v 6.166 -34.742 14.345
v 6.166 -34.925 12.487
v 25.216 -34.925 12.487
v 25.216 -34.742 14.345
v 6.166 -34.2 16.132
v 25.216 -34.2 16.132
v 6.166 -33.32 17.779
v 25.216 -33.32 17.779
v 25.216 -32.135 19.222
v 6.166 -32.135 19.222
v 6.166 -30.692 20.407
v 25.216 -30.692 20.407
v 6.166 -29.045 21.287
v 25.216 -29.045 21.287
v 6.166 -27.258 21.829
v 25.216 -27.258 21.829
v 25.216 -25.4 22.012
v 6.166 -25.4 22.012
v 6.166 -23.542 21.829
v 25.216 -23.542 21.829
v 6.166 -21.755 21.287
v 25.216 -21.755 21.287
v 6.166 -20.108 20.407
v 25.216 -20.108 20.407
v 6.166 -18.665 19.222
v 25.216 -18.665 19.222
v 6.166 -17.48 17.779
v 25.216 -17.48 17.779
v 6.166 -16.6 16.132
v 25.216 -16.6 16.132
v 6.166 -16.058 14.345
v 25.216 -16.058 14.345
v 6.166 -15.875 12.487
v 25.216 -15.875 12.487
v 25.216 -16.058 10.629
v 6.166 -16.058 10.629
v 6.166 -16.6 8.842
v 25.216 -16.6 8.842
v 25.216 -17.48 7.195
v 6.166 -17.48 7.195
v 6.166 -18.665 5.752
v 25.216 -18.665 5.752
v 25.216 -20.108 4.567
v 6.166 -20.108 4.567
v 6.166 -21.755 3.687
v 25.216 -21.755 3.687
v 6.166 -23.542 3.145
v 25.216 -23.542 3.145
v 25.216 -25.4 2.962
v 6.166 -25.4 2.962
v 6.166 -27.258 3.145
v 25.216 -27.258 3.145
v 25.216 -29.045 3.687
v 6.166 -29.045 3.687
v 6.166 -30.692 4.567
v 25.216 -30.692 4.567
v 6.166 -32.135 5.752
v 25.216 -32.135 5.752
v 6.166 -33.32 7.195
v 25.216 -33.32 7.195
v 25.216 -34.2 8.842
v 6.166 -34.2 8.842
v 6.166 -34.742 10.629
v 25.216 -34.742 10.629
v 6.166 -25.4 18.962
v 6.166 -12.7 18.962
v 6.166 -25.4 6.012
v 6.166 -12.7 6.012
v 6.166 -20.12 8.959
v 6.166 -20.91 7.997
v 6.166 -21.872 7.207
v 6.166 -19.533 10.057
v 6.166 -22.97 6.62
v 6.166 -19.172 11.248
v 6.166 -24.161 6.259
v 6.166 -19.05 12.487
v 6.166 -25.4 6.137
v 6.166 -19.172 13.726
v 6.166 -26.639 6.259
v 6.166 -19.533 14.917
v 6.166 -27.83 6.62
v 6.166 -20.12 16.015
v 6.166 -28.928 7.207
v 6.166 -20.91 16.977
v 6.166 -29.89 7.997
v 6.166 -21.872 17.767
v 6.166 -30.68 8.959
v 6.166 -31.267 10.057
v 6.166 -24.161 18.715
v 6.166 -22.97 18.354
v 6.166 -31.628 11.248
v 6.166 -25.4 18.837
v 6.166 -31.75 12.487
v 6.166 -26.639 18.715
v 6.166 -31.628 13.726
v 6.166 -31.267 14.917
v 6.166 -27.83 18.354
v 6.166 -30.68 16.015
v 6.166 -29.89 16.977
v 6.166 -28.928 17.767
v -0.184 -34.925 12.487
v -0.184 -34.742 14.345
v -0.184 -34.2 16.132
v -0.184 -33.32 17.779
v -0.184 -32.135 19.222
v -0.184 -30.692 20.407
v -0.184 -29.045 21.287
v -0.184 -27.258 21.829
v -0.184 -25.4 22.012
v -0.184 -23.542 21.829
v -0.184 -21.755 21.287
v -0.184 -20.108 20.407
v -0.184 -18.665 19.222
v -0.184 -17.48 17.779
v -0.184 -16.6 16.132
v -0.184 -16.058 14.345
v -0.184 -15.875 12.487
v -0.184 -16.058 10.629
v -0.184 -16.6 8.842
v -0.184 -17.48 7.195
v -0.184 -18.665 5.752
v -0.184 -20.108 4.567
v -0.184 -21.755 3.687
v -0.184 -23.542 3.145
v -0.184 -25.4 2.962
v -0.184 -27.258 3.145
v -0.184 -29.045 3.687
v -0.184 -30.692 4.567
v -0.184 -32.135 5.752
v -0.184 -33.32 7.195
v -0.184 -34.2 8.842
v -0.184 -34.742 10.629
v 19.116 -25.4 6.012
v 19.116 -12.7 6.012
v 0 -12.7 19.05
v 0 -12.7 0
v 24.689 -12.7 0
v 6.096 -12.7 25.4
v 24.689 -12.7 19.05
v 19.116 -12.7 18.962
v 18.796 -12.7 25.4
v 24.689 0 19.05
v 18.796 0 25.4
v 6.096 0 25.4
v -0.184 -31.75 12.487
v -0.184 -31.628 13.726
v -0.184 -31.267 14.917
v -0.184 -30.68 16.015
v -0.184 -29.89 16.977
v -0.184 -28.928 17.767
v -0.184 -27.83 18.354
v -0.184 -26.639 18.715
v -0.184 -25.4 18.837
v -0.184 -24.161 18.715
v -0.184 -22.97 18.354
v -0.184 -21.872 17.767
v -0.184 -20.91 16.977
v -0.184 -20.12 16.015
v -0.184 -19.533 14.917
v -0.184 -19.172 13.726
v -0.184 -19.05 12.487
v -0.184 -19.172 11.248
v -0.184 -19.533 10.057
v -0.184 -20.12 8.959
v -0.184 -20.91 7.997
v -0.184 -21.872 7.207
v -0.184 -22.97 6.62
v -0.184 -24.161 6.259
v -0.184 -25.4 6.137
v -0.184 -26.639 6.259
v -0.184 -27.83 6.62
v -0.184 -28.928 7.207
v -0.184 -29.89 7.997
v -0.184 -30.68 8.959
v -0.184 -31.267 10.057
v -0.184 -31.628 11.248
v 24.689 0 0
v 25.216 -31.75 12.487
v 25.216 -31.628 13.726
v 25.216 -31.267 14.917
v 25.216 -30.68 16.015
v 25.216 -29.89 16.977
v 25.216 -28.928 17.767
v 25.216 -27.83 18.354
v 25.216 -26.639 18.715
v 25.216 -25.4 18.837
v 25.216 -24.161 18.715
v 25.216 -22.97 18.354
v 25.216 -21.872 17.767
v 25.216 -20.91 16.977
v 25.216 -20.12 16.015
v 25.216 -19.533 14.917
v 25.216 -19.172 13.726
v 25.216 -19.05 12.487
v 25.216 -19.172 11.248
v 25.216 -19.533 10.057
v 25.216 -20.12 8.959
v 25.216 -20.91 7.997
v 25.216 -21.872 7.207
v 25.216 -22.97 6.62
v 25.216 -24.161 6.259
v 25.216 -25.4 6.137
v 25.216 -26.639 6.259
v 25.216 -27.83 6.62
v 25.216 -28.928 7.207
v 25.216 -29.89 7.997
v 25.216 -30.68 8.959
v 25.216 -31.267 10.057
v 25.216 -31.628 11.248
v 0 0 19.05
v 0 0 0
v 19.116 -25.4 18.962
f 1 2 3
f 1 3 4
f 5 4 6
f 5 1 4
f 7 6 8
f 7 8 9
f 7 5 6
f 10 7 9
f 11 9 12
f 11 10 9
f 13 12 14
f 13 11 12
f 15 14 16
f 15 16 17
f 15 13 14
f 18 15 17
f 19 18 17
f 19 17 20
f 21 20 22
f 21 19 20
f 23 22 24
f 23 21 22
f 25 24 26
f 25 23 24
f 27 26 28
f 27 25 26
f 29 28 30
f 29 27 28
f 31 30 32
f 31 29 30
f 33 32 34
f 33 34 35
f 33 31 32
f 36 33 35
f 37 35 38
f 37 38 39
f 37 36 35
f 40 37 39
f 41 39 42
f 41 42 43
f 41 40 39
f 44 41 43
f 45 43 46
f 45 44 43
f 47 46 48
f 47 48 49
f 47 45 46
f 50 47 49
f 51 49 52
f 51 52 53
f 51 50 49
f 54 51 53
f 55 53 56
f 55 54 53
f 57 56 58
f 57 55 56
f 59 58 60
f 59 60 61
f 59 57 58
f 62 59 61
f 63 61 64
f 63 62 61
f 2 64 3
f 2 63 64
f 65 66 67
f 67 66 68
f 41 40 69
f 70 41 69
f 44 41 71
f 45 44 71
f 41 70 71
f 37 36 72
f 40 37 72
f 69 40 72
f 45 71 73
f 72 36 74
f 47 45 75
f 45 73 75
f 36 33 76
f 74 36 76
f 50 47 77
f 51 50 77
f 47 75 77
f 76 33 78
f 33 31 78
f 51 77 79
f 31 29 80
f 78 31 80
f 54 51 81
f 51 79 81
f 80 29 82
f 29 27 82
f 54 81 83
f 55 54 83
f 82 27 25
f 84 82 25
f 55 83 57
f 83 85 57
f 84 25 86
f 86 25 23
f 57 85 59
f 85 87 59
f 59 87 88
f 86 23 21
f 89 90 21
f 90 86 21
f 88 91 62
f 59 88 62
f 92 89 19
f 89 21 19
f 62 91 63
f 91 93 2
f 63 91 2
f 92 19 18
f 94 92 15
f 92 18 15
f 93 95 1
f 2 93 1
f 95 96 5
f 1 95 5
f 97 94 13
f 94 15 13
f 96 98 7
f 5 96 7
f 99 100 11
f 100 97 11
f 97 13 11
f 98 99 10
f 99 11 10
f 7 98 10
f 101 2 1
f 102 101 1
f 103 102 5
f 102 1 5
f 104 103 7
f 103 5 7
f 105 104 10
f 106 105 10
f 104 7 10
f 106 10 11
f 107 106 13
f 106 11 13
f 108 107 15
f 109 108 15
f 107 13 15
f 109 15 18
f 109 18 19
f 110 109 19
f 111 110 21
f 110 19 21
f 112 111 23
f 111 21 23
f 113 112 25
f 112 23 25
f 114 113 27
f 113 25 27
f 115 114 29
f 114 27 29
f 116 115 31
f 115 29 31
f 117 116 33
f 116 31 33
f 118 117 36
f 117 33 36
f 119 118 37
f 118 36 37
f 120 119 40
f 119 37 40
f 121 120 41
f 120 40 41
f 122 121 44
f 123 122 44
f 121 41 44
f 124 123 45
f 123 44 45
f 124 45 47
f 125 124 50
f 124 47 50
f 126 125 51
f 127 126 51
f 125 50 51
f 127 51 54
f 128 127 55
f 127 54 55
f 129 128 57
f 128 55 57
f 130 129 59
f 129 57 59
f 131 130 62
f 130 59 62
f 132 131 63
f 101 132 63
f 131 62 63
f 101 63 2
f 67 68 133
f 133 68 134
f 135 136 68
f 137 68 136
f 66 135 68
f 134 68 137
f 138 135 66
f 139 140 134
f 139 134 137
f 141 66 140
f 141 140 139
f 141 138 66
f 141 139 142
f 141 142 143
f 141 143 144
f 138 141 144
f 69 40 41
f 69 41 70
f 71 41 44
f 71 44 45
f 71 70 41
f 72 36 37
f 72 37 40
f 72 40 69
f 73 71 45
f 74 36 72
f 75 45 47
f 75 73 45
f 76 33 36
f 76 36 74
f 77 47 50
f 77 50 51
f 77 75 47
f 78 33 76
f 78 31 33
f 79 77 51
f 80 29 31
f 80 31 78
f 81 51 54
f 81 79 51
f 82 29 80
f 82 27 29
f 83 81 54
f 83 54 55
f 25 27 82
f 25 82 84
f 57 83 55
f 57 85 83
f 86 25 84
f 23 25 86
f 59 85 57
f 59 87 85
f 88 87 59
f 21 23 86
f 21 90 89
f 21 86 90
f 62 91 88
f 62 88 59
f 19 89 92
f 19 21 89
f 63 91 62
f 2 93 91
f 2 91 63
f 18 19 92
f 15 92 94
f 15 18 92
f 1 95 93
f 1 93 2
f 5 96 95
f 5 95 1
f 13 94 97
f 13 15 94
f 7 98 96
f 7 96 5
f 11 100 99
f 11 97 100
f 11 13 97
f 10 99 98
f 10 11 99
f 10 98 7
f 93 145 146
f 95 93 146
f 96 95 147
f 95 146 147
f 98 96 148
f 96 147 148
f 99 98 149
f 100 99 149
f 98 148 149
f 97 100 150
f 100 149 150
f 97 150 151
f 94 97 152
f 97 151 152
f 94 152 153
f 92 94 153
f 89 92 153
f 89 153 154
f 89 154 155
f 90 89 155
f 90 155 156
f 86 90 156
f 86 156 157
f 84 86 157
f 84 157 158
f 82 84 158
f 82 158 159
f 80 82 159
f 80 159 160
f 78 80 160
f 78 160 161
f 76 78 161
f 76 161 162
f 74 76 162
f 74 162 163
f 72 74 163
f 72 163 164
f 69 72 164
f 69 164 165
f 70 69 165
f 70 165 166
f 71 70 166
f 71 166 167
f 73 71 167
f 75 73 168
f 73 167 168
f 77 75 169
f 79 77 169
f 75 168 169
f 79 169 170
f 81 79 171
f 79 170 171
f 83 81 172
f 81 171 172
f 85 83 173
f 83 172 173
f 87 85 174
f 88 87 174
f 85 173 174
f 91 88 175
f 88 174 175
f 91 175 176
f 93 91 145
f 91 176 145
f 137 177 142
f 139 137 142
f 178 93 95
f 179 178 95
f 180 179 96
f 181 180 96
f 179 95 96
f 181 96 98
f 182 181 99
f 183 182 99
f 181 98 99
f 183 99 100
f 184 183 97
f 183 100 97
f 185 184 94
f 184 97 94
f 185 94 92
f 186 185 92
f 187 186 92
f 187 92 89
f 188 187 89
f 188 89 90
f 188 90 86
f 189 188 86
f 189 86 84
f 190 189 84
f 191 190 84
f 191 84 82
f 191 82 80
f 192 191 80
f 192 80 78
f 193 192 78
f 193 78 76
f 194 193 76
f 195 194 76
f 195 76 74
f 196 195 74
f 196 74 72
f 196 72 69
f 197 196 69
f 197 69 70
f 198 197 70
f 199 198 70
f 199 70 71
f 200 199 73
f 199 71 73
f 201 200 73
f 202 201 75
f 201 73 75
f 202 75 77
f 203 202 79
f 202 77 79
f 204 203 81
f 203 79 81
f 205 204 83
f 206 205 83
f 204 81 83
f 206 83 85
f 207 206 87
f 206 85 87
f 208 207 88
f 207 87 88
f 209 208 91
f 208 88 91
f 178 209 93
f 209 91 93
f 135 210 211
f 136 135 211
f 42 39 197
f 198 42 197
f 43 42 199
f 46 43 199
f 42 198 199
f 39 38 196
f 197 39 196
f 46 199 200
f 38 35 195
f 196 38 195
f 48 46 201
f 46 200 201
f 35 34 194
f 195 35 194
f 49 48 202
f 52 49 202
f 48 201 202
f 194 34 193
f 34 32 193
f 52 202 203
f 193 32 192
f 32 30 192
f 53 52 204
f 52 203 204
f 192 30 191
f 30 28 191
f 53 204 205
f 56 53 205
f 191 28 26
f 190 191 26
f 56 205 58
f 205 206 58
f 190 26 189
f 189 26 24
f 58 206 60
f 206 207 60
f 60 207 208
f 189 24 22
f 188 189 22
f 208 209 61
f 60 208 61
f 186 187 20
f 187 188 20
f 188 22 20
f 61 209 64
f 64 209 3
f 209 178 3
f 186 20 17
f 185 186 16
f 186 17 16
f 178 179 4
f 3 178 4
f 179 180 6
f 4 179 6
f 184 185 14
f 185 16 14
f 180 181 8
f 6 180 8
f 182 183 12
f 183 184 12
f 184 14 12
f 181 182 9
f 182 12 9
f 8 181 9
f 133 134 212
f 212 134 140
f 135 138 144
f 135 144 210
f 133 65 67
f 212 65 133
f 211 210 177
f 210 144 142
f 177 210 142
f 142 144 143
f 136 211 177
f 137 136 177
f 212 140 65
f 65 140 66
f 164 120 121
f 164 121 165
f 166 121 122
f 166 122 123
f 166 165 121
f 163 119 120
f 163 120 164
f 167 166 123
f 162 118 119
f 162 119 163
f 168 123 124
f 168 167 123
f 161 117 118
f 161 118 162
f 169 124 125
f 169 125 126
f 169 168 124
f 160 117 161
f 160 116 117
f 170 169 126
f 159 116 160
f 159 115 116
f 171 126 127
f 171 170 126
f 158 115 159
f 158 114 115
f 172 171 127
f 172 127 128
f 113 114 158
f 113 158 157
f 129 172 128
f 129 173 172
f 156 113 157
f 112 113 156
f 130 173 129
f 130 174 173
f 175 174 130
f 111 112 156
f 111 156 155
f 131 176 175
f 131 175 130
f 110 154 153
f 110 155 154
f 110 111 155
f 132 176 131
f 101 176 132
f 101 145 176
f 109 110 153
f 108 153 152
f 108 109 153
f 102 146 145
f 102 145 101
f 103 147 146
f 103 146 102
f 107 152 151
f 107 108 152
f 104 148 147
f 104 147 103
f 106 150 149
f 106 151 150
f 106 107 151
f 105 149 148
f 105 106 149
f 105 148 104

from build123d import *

# Parameters (mm, degrees)
F1_DEPTH  = 12.7
F3_DEPTH  = 12.7
F5_DEPTH  = 12.7
F7_DEPTH  = 12.7
F8_R      = 9.525
F9_DEPTH  = 19.05
F10_DEPTH = 6.35
F11_R     = 6.35
F12_DEPTH = 25.4


# Not quite as in the source:
# - a feature of the source that left no trace in its solid (it failed there, or was rolled back) is left out


with BuildPart() as f1:
    # F0 (on Front) → F1 (new body)
    with BuildSketch(Plane.XZ):
        Polygon((0, 19.05), (0, 0), (24.6888007513, 0), (24.6888007513, 19.05), (18.7959997422, 19.05), (18.7959997422, 25.4), (6.0959997422, 25.4), (6.0959997422, 19.05), align=None)
    extrude(amount=F1_DEPTH)

    # F2 (on face) → F3 (join)
    with BuildSketch(Plane.XZ.offset(12.7)):
        Polygon((6.0959997422, 25.4), (0, 19.05), (6.0959997422, 19.05), align=None)
    extrude(amount=-F3_DEPTH)

    # F4 (on face) → F5 (join)
    with BuildSketch(Plane.XZ.offset(12.7)):
        Polygon((24.6888007513, 19.05), (18.7959997422, 25.4), (18.7959997422, 19.05), align=None)
    extrude(amount=-F5_DEPTH)

    # F6 (on face) → F7 (join)
    with BuildSketch(Plane.XZ.offset(12.7)):
        Polygon((19.1160719842, 18.9619082958), (12.6412734389, 18.9619082958), (6.1664739624, 18.9619082958), (6.1664739624, 6.0123121366), (19.1160719842, 6.0123121366), align=None)
    extrude(amount=F7_DEPTH)


with BuildPart() as f9:
    # F8 (on face) → F9 (new body)
    with BuildSketch(Plane(origin=(6.1664739624, 0, 0), x_dir=(0, -1, 0), z_dir=(-1, 0, 0))):
        with Locations((25.4, 12.4871102162)):
            Circle(F8_R)
    extrude(amount=-F9_DEPTH)


with BuildPart() as f10:
    # F10 (new): a face of the model
    f10_faces = [f9.part.faces().sort_by_distance(p)[0] for p in [
        (6.1664739624, -25.4, 12.4871102162),
    ]]
    extrude(f10_faces, amount=F10_DEPTH)


with BuildPart() as f12_tool:
    # F11 (on face) → F12 (new body)
    with BuildSketch(Plane(origin=(-0.1835260376, 0, 0), x_dir=(0, -1, 0), z_dir=(-1, 0, 0))):
        with Locations((25.4, 12.4871102162)):
            Circle(F11_R)
    extrude(amount=-F12_DEPTH)


with BuildPart() as f9_1:
    add(f9.part)

    # F12: cut by f12_tool
    add(f12_tool.part, mode=Mode.SUBTRACT)


with BuildPart() as f10_1:
    add(f10.part)

    # F12: cut by f12_tool
    add(f12_tool.part, mode=Mode.SUBTRACT)


solid = Compound([f1.part, f9_1.part, f10_1.part])
